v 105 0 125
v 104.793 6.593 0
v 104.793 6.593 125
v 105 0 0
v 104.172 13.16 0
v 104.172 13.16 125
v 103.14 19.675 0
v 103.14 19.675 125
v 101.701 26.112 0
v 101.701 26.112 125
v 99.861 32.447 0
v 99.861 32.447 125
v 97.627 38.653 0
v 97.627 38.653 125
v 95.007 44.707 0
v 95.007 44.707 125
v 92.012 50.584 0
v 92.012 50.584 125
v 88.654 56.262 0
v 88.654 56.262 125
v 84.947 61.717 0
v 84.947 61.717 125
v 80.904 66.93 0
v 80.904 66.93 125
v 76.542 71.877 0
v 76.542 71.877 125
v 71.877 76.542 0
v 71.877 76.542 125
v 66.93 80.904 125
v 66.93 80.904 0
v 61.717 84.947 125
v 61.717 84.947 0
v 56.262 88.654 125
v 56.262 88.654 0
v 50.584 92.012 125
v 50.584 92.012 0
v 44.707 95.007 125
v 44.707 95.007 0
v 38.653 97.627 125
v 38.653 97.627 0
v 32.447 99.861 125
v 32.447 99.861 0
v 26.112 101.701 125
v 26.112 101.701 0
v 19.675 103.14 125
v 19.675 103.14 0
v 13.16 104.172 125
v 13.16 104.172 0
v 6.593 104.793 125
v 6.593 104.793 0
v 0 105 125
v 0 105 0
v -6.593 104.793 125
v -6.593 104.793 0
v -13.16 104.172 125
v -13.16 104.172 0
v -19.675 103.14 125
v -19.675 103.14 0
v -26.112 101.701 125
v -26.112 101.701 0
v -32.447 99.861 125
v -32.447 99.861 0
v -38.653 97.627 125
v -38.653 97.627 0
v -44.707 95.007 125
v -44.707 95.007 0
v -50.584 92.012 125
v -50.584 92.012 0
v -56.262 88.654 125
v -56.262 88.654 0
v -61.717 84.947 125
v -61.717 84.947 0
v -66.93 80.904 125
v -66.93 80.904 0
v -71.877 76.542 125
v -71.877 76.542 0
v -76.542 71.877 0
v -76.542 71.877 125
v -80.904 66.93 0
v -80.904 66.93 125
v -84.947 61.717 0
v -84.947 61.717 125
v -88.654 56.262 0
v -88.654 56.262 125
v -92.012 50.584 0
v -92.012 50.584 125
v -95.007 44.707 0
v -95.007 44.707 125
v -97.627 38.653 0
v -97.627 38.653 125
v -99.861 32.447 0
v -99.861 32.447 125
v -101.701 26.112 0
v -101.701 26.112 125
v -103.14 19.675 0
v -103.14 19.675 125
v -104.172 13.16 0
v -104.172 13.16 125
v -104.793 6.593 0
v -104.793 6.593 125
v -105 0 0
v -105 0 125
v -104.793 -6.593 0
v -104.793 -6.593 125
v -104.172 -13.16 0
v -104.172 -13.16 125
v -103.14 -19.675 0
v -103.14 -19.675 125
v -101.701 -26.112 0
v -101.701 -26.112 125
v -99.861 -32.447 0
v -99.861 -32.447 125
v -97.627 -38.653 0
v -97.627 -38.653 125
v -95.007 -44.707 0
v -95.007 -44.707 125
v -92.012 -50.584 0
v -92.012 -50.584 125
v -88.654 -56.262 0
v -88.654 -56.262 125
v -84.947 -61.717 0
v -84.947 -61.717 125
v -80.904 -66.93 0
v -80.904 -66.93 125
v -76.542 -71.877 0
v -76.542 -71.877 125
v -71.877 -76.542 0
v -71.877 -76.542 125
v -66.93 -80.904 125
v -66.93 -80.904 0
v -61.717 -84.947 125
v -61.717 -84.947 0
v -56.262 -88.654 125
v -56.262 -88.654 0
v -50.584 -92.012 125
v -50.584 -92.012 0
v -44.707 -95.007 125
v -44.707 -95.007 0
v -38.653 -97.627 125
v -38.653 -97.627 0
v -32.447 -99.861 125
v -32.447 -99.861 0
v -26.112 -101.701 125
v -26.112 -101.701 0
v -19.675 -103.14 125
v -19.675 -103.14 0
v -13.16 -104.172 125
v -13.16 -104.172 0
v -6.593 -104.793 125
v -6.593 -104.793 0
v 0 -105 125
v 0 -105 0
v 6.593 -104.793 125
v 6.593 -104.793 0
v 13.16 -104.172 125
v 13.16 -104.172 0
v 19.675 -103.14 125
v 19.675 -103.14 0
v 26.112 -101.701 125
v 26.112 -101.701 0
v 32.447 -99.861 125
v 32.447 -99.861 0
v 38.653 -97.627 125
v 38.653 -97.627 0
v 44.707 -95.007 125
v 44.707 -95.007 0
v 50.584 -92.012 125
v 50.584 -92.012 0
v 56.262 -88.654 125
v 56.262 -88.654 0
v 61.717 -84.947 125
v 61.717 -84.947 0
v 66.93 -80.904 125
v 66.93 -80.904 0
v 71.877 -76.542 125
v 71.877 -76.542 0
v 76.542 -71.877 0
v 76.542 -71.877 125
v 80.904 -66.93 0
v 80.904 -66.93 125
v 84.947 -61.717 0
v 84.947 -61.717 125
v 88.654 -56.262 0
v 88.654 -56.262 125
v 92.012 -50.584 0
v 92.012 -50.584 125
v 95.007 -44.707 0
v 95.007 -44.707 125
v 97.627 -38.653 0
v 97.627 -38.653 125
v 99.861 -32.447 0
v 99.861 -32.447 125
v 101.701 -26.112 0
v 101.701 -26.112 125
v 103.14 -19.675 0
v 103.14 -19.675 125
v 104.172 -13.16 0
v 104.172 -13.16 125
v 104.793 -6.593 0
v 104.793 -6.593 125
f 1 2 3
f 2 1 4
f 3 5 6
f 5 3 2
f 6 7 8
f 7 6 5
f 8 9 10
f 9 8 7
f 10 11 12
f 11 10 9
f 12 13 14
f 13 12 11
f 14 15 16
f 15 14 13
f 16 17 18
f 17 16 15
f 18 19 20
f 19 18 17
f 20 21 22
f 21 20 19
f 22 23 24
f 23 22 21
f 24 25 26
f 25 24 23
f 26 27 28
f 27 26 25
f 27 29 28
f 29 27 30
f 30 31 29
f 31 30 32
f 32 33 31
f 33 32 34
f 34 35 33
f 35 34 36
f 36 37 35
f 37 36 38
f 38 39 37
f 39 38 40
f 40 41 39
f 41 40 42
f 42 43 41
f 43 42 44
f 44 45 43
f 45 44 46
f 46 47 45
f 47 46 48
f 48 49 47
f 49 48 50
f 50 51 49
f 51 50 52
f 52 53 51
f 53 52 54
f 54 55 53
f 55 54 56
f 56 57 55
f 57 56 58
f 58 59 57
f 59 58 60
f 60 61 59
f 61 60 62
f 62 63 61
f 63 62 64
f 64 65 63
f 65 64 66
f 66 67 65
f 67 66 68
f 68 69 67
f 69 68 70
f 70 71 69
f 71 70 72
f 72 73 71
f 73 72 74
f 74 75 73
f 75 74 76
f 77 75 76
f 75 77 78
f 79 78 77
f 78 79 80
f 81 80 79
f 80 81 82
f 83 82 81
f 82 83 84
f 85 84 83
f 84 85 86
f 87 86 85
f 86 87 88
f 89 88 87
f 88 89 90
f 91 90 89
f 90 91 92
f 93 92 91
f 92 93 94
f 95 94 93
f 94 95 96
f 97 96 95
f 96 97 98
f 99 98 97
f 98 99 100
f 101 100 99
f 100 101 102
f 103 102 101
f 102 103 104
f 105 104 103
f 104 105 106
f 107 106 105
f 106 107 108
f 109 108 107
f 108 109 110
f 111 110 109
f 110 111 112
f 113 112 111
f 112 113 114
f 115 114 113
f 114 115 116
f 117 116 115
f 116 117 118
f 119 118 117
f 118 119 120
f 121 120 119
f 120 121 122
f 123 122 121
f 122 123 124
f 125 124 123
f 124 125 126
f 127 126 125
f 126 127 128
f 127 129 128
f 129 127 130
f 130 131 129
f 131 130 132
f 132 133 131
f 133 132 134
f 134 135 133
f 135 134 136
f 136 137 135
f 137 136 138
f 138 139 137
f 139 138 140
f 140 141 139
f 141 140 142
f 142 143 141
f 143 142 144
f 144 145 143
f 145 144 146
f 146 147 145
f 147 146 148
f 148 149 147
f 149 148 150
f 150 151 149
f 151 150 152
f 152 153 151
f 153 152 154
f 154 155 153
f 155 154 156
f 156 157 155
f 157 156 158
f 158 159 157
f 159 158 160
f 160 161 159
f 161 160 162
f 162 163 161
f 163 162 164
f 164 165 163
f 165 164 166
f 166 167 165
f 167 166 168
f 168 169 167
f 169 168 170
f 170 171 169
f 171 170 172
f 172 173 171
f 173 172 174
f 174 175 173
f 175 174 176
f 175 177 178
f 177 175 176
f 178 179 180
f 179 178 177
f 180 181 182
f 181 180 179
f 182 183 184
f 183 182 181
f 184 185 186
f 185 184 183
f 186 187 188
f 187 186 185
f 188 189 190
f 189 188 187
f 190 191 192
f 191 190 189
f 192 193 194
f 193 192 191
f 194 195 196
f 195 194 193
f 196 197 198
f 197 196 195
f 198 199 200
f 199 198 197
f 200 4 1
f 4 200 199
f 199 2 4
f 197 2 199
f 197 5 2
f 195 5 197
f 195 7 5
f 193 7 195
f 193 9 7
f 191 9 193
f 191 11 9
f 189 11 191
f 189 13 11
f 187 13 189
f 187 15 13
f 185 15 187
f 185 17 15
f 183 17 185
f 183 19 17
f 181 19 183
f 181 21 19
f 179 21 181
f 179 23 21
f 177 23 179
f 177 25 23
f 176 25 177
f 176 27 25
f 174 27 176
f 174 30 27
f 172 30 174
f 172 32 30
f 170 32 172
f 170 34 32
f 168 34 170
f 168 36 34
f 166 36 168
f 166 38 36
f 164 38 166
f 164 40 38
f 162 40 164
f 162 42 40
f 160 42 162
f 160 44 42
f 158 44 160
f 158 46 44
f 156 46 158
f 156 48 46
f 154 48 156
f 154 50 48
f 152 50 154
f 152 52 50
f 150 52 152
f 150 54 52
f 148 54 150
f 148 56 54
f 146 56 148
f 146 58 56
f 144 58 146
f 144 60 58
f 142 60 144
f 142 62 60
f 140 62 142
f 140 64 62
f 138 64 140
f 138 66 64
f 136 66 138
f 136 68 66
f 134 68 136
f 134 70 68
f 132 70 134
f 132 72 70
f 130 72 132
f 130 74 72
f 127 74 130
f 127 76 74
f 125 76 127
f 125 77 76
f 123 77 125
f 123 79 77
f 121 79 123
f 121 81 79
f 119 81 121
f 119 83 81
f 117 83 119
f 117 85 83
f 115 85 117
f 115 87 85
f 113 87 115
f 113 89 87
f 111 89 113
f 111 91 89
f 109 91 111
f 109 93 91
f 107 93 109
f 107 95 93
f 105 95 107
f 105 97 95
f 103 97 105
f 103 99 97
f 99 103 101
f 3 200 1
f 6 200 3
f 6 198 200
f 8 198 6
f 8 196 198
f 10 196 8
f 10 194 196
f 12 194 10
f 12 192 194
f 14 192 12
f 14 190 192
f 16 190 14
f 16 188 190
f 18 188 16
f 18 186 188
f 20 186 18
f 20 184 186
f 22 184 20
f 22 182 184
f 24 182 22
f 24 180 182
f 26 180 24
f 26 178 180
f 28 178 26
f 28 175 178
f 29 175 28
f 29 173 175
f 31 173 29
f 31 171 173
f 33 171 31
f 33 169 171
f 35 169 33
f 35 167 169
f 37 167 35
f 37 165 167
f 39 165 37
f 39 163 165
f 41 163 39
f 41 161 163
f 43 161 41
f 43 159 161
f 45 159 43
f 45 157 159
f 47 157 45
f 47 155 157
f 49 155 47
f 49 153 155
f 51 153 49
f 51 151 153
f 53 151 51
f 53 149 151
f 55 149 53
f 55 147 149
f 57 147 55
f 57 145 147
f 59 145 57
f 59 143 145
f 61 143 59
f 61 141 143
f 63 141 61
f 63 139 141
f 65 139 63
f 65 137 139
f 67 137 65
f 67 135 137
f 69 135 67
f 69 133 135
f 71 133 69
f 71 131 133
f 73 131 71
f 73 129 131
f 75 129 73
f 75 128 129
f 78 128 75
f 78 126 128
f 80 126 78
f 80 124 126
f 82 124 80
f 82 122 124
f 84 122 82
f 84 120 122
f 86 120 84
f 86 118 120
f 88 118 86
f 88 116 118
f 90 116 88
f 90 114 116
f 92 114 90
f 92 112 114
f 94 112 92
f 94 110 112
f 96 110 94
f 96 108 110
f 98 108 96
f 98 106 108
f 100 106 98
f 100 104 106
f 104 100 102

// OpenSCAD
        // Housing (placeholder)
        $fn = 100;
        module housing() {
            cylinder(h=125, d=210);
        }
        housing();
        
